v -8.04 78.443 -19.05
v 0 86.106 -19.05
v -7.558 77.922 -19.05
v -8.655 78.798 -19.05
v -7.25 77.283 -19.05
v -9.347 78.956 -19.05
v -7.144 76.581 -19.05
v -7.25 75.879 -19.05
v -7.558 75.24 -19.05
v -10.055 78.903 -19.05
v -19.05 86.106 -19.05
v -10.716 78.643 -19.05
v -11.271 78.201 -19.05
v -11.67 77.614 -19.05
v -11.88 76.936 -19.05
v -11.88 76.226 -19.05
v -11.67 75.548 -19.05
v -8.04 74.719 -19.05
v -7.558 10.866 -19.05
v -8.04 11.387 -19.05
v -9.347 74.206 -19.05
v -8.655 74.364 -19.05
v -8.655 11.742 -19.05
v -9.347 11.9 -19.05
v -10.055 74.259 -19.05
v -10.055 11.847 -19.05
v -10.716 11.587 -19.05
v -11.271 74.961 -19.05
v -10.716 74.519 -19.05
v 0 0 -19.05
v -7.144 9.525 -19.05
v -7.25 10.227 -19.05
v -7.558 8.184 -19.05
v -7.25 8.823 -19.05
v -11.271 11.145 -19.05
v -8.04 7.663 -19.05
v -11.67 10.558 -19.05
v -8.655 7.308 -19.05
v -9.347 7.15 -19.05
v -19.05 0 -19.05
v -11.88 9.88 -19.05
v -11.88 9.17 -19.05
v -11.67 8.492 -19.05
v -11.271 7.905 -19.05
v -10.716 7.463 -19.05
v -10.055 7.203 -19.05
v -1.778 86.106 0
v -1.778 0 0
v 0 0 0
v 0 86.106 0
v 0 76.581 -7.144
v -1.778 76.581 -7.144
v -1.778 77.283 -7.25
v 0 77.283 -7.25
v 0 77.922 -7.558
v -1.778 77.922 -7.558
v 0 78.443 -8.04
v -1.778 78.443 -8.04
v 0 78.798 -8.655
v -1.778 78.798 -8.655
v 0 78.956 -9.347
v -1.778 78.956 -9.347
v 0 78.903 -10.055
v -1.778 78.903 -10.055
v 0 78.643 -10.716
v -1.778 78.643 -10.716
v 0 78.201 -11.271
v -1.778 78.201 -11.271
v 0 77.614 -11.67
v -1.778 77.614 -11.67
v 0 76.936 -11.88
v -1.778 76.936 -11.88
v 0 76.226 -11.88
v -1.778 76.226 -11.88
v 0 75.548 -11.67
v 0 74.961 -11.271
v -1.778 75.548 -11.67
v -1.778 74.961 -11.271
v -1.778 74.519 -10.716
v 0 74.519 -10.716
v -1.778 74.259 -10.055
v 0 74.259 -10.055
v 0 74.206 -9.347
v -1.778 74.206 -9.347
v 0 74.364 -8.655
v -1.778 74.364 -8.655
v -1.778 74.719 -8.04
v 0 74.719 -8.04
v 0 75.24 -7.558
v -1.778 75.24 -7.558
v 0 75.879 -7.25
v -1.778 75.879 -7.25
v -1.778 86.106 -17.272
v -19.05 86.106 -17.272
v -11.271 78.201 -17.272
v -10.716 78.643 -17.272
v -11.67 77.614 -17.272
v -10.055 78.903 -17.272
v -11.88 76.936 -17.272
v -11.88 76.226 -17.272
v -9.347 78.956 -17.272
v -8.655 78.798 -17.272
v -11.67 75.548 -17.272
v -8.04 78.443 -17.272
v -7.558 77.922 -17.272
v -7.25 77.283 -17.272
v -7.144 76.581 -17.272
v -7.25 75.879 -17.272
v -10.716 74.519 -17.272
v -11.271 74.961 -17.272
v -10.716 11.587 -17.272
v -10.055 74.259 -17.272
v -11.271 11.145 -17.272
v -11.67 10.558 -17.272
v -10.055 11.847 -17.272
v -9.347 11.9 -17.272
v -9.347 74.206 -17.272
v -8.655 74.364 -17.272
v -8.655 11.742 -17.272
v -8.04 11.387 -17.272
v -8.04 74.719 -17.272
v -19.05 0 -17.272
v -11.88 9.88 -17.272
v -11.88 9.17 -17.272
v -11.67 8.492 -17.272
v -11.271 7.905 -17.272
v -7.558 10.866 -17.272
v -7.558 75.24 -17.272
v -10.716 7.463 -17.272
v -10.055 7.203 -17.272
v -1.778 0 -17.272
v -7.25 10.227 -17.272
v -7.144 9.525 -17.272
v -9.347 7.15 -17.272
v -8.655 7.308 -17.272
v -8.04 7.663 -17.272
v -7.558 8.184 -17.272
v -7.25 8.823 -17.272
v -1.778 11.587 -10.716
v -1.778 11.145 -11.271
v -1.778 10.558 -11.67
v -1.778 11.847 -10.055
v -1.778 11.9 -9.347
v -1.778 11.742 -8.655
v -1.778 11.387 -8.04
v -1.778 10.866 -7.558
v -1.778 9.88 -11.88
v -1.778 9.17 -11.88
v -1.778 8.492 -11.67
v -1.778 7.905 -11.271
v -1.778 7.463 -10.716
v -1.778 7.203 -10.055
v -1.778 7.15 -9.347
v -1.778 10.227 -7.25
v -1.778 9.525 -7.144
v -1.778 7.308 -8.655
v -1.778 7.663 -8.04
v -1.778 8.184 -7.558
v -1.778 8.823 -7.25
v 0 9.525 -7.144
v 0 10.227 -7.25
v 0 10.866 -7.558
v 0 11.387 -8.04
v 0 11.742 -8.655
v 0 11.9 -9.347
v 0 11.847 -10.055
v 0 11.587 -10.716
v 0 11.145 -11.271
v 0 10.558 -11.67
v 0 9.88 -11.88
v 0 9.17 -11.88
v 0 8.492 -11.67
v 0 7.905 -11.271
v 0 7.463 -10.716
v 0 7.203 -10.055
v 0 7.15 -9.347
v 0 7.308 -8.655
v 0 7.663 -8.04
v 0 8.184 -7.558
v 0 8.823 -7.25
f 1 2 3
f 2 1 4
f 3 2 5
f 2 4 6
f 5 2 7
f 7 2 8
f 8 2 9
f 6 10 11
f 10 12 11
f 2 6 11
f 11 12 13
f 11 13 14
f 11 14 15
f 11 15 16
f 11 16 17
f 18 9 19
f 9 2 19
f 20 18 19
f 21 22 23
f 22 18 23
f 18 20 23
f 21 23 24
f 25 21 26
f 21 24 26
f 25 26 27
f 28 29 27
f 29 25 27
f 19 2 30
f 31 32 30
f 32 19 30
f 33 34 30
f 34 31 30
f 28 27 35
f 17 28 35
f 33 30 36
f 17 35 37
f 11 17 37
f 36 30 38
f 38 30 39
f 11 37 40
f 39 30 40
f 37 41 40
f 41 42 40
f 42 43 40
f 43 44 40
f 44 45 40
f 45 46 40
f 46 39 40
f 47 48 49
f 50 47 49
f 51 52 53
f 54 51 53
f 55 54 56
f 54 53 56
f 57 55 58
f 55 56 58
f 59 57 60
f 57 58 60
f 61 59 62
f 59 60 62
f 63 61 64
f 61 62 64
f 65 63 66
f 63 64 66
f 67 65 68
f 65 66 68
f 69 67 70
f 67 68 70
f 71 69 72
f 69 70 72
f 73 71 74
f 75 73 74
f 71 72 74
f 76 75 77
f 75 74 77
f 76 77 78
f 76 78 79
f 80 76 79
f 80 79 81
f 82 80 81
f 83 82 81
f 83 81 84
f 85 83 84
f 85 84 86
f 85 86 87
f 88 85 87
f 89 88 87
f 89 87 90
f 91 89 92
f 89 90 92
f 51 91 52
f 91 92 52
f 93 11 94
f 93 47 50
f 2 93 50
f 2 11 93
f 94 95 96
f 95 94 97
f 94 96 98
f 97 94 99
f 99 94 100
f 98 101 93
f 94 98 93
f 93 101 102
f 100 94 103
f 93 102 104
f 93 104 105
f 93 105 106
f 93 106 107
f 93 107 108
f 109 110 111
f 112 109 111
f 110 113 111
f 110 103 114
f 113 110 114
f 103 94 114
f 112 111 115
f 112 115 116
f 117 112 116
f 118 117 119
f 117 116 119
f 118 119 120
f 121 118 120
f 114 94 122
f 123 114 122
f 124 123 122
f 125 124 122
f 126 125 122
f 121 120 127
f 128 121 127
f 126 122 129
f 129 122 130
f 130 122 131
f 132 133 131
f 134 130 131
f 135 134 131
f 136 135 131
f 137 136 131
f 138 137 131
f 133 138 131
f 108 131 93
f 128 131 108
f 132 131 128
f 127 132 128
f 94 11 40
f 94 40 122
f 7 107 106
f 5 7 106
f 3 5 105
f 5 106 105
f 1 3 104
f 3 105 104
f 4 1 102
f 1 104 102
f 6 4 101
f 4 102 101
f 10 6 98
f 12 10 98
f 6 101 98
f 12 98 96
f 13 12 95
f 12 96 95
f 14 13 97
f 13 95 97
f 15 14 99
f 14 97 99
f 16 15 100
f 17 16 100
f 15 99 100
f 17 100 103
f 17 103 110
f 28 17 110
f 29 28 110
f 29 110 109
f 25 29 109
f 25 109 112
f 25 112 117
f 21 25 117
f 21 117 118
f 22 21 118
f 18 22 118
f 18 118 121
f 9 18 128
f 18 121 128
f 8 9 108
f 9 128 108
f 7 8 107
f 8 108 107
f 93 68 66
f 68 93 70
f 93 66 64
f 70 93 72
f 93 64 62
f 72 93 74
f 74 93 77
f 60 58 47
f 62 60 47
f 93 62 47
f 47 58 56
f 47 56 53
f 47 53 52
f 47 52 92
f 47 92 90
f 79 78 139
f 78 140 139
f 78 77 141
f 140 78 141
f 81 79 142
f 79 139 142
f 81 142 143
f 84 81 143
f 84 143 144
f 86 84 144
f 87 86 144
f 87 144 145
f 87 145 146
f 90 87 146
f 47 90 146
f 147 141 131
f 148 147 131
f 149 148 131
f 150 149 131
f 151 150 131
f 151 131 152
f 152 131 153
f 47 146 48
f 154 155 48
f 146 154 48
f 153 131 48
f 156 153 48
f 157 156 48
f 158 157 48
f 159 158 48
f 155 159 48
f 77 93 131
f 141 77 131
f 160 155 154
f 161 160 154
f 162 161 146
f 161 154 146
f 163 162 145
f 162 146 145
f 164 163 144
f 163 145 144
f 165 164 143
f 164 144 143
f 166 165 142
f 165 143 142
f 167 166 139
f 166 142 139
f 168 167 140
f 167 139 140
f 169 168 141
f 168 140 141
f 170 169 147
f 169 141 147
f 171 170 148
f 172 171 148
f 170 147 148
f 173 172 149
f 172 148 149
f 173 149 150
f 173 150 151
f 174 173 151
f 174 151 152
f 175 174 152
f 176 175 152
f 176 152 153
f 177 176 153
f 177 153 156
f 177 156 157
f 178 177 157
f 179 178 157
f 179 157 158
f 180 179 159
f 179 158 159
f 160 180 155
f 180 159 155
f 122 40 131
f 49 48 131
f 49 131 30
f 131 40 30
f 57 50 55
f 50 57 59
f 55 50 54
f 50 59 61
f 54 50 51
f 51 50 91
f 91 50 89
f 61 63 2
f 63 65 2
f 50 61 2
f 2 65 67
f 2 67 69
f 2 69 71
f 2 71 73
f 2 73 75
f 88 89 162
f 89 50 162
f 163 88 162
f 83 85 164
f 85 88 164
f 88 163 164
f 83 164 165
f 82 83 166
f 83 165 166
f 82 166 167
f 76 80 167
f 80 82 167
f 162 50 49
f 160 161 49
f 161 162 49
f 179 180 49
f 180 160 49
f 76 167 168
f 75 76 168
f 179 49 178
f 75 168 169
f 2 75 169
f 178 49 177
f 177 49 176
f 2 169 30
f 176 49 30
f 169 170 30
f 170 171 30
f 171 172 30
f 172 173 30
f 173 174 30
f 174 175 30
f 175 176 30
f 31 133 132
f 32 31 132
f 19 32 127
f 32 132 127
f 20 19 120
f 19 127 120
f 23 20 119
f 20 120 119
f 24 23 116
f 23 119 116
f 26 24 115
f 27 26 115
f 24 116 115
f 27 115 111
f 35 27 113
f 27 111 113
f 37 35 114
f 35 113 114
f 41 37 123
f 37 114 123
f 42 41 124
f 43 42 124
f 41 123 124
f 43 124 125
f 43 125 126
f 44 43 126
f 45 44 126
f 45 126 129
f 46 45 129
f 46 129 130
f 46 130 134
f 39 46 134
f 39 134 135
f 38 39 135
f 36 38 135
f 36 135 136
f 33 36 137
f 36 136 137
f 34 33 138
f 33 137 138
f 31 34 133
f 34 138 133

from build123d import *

# Parameters (mm, degrees)
BOSS_EXTRUDE1_DEPTH = 86.106
SKETCH2_R           = 2.38125
CUT_EXTRUDE1_DEPTH  = 1.778
SKETCH3_R           = 2.38125
CUT_EXTRUDE2_DEPTH  = 1.778


with BuildPart() as part:
    # Sketch1 → Boss-Extrude1 (new body)
    with BuildSketch(Plane(origin=(0, 0, 0), x_dir=(1, 0, 0), z_dir=(0, 1, 0))):
        Polygon((0, 0), (0, 19.05), (-19.05, 19.05), (-19.05, 17.272), (-1.778, 17.272), (-1.778, 0), align=None)
    extrude(amount=BOSS_EXTRUDE1_DEPTH)

    # Sketch2 → Cut-Extrude1 (cut)
    with BuildSketch(Plane.ZY.offset(1.778)):
        with Locations((-9.525, 76.581)):
            Circle(SKETCH2_R)
        with Locations((-9.525, 9.525)):
            Circle(SKETCH2_R)
    extrude(amount=-CUT_EXTRUDE1_DEPTH, mode=Mode.SUBTRACT)

    # Sketch3 → Cut-Extrude2 (cut)
    with BuildSketch(Plane.XY.offset(-17.272)):
        with Locations((-9.525, 9.525)):
            Circle(SKETCH3_R)
        with Locations((-9.525, 76.581)):
            Circle(SKETCH3_R)
    extrude(amount=-CUT_EXTRUDE2_DEPTH, mode=Mode.SUBTRACT)


solid = part.part
